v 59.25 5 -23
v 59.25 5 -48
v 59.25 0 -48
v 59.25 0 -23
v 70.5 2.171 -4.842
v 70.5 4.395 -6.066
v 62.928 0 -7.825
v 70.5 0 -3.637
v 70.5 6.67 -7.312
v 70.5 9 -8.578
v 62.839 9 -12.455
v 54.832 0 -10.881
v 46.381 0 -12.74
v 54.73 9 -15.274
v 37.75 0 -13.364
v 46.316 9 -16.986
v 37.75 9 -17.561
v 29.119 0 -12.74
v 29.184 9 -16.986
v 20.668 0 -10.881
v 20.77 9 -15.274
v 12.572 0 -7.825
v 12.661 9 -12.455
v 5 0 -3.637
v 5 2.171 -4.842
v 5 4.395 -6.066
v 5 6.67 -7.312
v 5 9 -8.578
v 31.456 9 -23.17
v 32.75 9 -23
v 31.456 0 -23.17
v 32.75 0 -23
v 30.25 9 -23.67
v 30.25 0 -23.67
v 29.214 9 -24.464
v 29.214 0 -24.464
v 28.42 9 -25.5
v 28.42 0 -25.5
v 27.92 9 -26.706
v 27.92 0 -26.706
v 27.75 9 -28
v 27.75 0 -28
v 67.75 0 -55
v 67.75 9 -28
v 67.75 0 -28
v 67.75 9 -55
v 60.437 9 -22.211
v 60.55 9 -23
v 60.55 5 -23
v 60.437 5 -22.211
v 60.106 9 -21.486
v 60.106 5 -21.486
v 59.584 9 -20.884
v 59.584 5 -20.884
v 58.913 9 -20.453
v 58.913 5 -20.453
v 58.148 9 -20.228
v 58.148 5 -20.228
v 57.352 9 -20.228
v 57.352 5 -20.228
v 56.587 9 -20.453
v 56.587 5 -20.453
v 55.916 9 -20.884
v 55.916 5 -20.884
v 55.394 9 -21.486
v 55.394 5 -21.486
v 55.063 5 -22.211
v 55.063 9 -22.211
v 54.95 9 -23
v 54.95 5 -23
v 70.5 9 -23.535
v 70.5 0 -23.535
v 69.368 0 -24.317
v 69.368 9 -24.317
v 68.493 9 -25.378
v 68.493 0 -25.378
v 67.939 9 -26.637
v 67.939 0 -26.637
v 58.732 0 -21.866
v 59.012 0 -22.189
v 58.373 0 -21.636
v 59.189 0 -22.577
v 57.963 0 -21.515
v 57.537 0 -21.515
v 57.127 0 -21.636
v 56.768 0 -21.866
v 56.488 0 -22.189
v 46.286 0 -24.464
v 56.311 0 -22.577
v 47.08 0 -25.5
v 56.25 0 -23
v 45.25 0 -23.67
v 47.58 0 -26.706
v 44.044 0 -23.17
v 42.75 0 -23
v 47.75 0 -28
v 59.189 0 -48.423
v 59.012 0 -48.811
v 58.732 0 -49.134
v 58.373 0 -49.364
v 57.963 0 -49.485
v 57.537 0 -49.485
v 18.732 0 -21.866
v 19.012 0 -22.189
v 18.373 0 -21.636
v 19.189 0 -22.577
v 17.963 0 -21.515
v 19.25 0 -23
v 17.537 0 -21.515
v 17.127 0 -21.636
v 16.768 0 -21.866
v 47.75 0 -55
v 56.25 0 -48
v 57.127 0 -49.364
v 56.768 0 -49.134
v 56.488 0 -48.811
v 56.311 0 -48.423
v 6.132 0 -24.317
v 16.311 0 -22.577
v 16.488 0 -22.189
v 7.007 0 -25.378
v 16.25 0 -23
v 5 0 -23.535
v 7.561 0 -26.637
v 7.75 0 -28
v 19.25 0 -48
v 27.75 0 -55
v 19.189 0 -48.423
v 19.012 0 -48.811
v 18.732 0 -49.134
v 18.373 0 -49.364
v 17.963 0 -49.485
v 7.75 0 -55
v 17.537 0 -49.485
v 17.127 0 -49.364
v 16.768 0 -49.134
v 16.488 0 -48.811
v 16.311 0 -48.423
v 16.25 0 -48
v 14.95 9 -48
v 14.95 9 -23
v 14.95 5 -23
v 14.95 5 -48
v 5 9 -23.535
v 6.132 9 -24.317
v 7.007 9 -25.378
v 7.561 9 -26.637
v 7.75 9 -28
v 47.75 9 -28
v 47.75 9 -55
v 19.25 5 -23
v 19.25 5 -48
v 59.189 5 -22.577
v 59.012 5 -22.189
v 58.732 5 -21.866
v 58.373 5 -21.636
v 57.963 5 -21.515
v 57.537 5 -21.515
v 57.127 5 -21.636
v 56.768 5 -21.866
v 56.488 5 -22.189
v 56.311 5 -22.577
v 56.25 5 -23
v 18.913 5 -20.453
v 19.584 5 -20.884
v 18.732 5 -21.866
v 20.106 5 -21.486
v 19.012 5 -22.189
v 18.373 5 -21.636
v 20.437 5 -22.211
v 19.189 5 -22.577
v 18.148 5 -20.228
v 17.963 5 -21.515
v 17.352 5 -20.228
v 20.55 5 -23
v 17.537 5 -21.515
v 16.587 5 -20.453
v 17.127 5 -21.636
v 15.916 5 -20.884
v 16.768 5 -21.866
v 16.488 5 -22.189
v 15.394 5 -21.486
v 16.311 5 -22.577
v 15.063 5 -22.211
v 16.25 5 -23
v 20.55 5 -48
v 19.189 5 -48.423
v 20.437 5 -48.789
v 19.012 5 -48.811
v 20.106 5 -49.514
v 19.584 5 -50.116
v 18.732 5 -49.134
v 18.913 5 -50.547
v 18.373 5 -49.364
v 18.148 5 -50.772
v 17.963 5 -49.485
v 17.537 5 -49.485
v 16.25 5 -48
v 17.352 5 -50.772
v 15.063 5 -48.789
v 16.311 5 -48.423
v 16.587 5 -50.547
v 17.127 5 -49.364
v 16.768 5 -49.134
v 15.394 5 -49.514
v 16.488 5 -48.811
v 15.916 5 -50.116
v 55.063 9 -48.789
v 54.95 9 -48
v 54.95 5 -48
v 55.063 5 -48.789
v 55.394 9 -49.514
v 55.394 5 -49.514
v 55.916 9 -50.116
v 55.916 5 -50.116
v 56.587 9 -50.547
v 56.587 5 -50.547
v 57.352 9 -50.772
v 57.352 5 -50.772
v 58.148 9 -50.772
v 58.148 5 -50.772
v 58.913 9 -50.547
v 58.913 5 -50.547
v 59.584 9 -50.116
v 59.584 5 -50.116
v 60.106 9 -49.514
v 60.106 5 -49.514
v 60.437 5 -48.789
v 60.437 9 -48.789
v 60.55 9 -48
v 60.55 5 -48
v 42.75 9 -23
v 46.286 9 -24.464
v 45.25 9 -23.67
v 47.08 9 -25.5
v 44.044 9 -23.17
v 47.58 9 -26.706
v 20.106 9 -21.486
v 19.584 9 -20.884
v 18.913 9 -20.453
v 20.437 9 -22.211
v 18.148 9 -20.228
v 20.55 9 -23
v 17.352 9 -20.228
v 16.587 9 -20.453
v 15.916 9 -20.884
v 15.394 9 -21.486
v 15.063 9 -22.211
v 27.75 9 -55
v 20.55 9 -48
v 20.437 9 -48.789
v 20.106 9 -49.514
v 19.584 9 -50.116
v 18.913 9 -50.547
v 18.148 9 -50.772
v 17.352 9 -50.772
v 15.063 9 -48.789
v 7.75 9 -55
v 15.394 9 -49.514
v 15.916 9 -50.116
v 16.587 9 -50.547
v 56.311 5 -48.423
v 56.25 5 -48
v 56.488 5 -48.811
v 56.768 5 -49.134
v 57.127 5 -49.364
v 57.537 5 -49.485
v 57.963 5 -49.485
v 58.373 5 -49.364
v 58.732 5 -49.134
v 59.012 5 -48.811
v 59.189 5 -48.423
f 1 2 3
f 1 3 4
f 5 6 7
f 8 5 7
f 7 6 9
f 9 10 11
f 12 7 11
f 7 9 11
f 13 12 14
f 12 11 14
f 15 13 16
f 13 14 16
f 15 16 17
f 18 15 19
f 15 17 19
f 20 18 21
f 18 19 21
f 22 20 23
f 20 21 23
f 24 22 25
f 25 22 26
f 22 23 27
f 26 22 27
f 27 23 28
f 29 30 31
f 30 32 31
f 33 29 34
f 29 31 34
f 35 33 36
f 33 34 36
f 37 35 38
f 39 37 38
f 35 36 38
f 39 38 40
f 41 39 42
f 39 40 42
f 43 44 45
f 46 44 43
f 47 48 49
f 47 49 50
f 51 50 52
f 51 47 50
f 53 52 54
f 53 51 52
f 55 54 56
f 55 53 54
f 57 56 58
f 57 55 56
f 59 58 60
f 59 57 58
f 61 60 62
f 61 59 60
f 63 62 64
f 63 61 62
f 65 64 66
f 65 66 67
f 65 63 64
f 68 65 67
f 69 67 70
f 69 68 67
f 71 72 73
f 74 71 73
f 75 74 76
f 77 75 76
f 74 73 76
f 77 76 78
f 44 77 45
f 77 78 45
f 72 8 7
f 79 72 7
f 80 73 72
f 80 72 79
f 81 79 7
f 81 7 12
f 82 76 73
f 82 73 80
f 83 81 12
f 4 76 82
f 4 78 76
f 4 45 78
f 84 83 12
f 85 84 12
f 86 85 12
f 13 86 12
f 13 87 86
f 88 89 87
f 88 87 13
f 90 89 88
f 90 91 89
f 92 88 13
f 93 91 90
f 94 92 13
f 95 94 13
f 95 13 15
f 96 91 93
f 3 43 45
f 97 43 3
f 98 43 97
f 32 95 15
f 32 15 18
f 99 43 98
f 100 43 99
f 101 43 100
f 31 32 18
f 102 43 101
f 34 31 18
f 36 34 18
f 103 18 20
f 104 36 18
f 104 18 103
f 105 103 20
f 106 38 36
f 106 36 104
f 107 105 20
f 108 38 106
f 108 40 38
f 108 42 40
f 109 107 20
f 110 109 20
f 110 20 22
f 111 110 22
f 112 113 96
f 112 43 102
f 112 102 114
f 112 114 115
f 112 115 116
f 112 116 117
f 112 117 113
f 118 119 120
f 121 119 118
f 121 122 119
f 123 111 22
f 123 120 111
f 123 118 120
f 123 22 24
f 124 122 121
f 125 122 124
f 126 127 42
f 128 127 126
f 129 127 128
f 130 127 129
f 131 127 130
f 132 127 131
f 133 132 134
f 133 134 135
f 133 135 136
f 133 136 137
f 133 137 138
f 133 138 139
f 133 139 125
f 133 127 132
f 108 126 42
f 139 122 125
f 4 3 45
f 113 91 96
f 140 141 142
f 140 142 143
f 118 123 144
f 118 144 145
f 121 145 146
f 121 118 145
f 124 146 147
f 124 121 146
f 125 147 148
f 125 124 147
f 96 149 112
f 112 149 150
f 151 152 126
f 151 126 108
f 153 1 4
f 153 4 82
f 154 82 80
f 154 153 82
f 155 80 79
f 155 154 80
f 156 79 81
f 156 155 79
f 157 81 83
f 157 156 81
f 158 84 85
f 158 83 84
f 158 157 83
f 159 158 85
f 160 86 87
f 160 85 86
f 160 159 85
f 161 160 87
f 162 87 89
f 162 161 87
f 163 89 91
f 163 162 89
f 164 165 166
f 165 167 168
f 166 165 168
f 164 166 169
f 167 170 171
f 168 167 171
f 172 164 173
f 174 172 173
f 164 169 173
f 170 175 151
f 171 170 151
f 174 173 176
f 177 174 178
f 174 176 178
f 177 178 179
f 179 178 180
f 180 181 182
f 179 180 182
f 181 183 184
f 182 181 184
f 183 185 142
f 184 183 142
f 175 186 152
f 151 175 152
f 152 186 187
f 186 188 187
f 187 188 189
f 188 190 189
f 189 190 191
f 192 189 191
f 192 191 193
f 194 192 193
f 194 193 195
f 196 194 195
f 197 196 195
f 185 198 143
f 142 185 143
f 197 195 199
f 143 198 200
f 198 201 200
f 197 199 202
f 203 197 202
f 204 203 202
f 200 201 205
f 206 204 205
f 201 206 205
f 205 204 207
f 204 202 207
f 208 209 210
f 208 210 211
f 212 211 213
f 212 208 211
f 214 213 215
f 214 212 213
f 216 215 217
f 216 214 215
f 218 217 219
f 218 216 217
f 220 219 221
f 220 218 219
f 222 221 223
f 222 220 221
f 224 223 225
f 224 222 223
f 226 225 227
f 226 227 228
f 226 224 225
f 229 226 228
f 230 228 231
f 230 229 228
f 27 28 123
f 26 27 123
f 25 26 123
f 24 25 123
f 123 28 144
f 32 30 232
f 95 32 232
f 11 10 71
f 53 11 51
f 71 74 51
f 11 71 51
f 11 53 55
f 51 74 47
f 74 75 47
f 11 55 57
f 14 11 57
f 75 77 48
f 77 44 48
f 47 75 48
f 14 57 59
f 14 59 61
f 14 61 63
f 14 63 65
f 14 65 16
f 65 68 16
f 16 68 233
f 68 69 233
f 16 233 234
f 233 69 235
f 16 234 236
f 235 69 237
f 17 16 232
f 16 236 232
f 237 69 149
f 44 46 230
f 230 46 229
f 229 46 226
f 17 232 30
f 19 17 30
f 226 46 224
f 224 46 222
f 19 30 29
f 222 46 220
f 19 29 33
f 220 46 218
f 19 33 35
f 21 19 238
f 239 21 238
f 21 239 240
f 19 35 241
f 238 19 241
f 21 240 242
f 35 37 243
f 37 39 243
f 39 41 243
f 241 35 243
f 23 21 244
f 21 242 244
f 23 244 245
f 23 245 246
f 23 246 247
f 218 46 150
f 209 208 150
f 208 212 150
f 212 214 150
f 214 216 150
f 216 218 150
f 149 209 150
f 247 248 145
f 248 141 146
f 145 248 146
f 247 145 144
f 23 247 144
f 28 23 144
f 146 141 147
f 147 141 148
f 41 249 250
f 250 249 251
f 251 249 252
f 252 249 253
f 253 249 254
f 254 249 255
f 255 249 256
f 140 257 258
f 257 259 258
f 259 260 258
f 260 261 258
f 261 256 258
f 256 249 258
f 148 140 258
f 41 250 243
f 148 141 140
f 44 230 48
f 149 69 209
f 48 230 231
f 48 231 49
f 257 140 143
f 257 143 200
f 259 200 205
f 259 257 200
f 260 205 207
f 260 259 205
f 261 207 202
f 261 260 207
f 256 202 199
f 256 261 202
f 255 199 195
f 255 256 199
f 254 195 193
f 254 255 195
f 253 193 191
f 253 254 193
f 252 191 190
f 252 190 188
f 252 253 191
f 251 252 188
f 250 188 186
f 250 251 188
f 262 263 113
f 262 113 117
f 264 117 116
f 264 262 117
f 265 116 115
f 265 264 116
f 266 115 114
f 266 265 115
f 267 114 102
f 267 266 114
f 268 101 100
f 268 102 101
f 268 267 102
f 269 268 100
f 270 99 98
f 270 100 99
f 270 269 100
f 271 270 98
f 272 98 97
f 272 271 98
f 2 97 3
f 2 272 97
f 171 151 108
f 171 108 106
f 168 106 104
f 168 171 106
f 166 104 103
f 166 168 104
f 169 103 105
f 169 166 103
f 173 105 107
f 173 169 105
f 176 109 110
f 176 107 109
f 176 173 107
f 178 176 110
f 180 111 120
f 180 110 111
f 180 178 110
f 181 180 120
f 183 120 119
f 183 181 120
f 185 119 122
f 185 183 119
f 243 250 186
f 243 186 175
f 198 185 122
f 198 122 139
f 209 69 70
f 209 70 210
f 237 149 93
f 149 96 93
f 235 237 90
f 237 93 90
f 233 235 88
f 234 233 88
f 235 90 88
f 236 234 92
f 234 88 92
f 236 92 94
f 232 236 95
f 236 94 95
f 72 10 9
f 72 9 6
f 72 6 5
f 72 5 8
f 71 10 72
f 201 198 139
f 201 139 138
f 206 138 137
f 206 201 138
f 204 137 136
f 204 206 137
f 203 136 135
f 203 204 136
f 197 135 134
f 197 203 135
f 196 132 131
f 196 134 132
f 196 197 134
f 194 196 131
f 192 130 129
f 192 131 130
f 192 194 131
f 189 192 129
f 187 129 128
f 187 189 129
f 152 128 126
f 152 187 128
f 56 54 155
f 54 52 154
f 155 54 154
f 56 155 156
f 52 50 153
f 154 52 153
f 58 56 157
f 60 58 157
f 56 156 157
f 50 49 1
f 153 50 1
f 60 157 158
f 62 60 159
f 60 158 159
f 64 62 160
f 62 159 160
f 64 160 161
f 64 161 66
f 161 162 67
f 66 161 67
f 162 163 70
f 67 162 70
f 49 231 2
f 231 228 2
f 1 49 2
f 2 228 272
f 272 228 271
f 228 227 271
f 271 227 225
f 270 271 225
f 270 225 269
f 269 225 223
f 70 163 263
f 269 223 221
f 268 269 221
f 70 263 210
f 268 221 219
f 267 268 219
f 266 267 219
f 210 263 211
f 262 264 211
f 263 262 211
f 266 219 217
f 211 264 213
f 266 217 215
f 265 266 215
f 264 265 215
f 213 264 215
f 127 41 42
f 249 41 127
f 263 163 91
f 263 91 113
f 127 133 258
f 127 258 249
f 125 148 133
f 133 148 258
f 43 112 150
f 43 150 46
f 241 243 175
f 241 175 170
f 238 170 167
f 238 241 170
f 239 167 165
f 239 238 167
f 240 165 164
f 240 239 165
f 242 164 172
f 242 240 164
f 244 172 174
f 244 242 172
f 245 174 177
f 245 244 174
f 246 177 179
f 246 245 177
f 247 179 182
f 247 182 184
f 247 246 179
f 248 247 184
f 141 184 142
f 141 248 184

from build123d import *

# Parameters (mm, degrees)
BOSS_EXTRUDE1_DEPTH = 9
CUT_EXTRUDE2_REACH  = 95.842
SKETCH5_W           = 20
SKETCH5_H           = 32
SKETCH5_W_2         = 7.75
CUT_EXTRUDE3_DEPTH  = 10
FILLET1_R           = 5
CUT_EXTRUDE4_DEPTH  = 4
CHAMFER1_SIZE       = 9
CHAMFER1_SIZE_2     = 4.196768923
CUT_EXTRUDE5_REACH  = 95.842
SKETCH7_W           = 5
SKETCH7_H           = 33.085129134
SKETCH7_H_2         = 33.745309592


with BuildPart() as part:
    # Sketch1 → Boss-Extrude1 (new body)
    with BuildSketch(Plane(origin=(0, 0, 0), x_dir=(1, 0, 0), z_dir=(0, 1, 0))):
        with BuildLine():
            Line((0, 0), (0, 55))
            Line((0, 55), (75.5, 55))
            Line((75.5, 55), (75.5, 0))
            ThreePointArc((75.5, 0), (37.75, 13.36377481), (0, 0))
        make_face()
    extrude(amount=BOSS_EXTRUDE1_DEPTH)

    # Sketch4 → Cut-Extrude2 (cut, up to next)
    with BuildSketch(Plane(origin=(0, 9, 0), x_dir=(1, 0, 0), z_dir=(0, 1, 0)), mode=Mode.PRIVATE) as cut_extrude2_sk1:
        with BuildLine():
            Line((19.25, 48), (19.25, 23))
            ThreePointArc((19.25, 23), (17.75, 21.5), (16.25, 23))
            Line((16.25, 23), (16.25, 48))
            ThreePointArc((16.25, 48), (17.75, 49.5), (19.25, 48))
        make_face()
    cut_extrude2_tool1 = extrude(cut_extrude2_sk1.sketch, amount=-CUT_EXTRUDE2_REACH, mode=Mode.PRIVATE) & part.part
    # Sketch4 → Cut-Extrude2 (cut, up to next)
    with BuildSketch(Plane(origin=(0, 9, 0), x_dir=(1, 0, 0), z_dir=(0, 1, 0)), mode=Mode.PRIVATE) as cut_extrude2_sk2:
        with BuildLine():
            Line((59.25, 48), (59.25, 23))
            ThreePointArc((59.25, 23), (57.75, 21.5), (56.25, 23))
            Line((56.25, 23), (56.25, 48))
            ThreePointArc((56.25, 48), (57.75, 49.5), (59.25, 48))
        make_face()
    cut_extrude2_tool2 = extrude(cut_extrude2_sk2.sketch, amount=-CUT_EXTRUDE2_REACH, mode=Mode.PRIVATE) & part.part
    add(cut_extrude2_tool1.solids().sort_by_distance((17.75, 9, -35.5))[0], mode=Mode.SUBTRACT)
    add(cut_extrude2_tool2.solids().sort_by_distance((57.75, 9, -35.5))[0], mode=Mode.SUBTRACT)

    # Sketch5 → Cut-Extrude3 (cut)
    with BuildSketch(Plane(origin=(0, 9, 0), x_dir=(1, 0, 0), z_dir=(0, 1, 0))):
        with Locations((37.75, 39)):
            Rectangle(SKETCH5_W, SKETCH5_H)
        with Locations((71.625, 39)):
            Rectangle(SKETCH5_W_2, SKETCH5_H)
        with Locations((3.875, 39)):
            Rectangle(SKETCH5_W_2, SKETCH5_H)
    extrude(amount=-CUT_EXTRUDE3_DEPTH, mode=Mode.SUBTRACT)

    # Fillet1
    fillet1_edges = [part.edges().sort_by_distance(p)[0] for p in [
        (27.75, 4.5, -23),
        (47.75, 4.5, -23),
        (7.75, 4.5, -23),
        (67.75, 4.5, -23),
    ]]
    fillet(fillet1_edges, radius=FILLET1_R)

    # Sketch6 → Cut-Extrude4 (cut)
    with BuildSketch(Plane(origin=(0, 9, 0), x_dir=(1, 0, 0), z_dir=(0, 1, 0))):
        with BuildLine():
            Line((20.55, 48), (20.55, 23))
            ThreePointArc((20.55, 23), (17.75, 20.2), (14.95, 23))
            Line((14.95, 23), (14.95, 48))
            ThreePointArc((14.95, 48), (17.75, 50.8), (20.55, 48))
        make_face()
        with BuildLine():
            Line((60.55, 48), (60.55, 23))
            ThreePointArc((60.55, 23), (57.75, 20.2), (54.95, 23))
            Line((54.95, 23), (54.95, 48))
            ThreePointArc((54.95, 48), (57.75, 50.8), (60.55, 48))
        make_face()
    extrude(amount=-CUT_EXTRUDE4_DEPTH, mode=Mode.SUBTRACT)

    # Chamfer1
    # the kernel refuses this chamfer: 9, 4.196768923 mm, written as the material it takes off along each edge
    with BuildSketch(Plane(origin=(37.75, 9, 46.63622519), x_dir=(0.8768373409785211, 0, -0.4807871436152561), z_dir=(0.4807871436152561, 0, 0.8768373409785211))) as chamfer1_piece_1:
        Polygon((60, -CHAMFER1_SIZE), (60 + CHAMFER1_SIZE_2, 0), (60, 0), align=None)
    revolve(axis=Axis((37.75, 9, 46.63622519), (0, 1, 0)), revolution_arc=122.526351541, mode=Mode.SUBTRACT)

    # Sketch7 → Cut-Extrude5 (cut, up to next)
    with BuildSketch(Plane(origin=(0, 9, 0), x_dir=(1, 0, 0), z_dir=(0, 1, 0)), mode=Mode.PRIVATE) as cut_extrude5_sk1:
        with Locations((2.5, 16.542564567)):
            Rectangle(SKETCH7_W, SKETCH7_H)
    cut_extrude5_tool1 = extrude(cut_extrude5_sk1.sketch, amount=-CUT_EXTRUDE5_REACH, mode=Mode.PRIVATE) & part.part
    # Sketch7 → Cut-Extrude5 (cut, up to next)
    with BuildSketch(Plane(origin=(0, 9, 0), x_dir=(1, 0, 0), z_dir=(0, 1, 0)), mode=Mode.PRIVATE) as cut_extrude5_sk2:
        with Locations((73, 16.872654796)):
            Rectangle(SKETCH7_W, SKETCH7_H_2)
    cut_extrude5_tool2 = extrude(cut_extrude5_sk2.sketch, amount=-CUT_EXTRUDE5_REACH, mode=Mode.PRIVATE) & part.part
    add(cut_extrude5_tool1.solids().sort_by_distance((2.5, 9, -16.542565))[0], mode=Mode.SUBTRACT)
    add(cut_extrude5_tool2.solids().sort_by_distance((73, 9, -16.872655))[0], mode=Mode.SUBTRACT)


solid = part.part
